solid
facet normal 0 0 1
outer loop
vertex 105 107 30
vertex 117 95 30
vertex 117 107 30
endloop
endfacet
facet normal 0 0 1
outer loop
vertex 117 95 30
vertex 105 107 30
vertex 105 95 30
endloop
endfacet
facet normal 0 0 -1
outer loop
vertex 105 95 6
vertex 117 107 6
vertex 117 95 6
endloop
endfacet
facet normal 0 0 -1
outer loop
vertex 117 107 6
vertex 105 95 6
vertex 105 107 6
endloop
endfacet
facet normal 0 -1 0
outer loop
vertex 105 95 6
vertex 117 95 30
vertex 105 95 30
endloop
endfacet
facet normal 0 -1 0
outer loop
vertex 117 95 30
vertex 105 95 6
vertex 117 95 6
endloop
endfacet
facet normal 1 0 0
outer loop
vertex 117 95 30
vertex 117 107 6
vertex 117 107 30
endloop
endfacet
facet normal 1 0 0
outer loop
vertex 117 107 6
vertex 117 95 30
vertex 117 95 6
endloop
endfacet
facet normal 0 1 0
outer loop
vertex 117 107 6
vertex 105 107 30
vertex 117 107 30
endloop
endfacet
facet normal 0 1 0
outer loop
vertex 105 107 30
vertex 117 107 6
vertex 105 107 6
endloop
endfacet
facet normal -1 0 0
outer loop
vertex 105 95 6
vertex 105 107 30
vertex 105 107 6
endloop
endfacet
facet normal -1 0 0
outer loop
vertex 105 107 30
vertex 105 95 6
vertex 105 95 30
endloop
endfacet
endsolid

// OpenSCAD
// file: ../config.scad
// Shared project parameters.
// Replace EXAMPLE_* with real project parameter families after planning.

$fn = $preview ? 48 : 96;

// Manufacturing defaults — calibrate for the real printer/material.
FIT = 0.25;
PRESS_FIT = 0.10;
CLEARANCE = 0.40;
MIN_WALL = 2.40;

// Template demonstration geometry only.
EXAMPLE_PLATE = [80, 60, 6];
EXAMPLE_CORNER_R = 6;
EXAMPLE_HOLE_D = 4.4;
EXAMPLE_HOLE_SPACING = [60, 40];
EXAMPLE_ARM_L = 65;
EXAMPLE_ARM_W = 14;
EXAMPLE_ARM_H = 8;
EXAMPLE_PIVOT_D = 6;
EXAMPLE_MOTION_MIN = -45;
EXAMPLE_MOTION_MAX = 90;
// main file
include <../config.scad>

// A deliberately remote fixed obstruction used only to validate the generic
// collision/distance QA engine in a template repository.
translate([105, 95, EXAMPLE_PLATE[2]])
    cube([12, 12, 24]);
